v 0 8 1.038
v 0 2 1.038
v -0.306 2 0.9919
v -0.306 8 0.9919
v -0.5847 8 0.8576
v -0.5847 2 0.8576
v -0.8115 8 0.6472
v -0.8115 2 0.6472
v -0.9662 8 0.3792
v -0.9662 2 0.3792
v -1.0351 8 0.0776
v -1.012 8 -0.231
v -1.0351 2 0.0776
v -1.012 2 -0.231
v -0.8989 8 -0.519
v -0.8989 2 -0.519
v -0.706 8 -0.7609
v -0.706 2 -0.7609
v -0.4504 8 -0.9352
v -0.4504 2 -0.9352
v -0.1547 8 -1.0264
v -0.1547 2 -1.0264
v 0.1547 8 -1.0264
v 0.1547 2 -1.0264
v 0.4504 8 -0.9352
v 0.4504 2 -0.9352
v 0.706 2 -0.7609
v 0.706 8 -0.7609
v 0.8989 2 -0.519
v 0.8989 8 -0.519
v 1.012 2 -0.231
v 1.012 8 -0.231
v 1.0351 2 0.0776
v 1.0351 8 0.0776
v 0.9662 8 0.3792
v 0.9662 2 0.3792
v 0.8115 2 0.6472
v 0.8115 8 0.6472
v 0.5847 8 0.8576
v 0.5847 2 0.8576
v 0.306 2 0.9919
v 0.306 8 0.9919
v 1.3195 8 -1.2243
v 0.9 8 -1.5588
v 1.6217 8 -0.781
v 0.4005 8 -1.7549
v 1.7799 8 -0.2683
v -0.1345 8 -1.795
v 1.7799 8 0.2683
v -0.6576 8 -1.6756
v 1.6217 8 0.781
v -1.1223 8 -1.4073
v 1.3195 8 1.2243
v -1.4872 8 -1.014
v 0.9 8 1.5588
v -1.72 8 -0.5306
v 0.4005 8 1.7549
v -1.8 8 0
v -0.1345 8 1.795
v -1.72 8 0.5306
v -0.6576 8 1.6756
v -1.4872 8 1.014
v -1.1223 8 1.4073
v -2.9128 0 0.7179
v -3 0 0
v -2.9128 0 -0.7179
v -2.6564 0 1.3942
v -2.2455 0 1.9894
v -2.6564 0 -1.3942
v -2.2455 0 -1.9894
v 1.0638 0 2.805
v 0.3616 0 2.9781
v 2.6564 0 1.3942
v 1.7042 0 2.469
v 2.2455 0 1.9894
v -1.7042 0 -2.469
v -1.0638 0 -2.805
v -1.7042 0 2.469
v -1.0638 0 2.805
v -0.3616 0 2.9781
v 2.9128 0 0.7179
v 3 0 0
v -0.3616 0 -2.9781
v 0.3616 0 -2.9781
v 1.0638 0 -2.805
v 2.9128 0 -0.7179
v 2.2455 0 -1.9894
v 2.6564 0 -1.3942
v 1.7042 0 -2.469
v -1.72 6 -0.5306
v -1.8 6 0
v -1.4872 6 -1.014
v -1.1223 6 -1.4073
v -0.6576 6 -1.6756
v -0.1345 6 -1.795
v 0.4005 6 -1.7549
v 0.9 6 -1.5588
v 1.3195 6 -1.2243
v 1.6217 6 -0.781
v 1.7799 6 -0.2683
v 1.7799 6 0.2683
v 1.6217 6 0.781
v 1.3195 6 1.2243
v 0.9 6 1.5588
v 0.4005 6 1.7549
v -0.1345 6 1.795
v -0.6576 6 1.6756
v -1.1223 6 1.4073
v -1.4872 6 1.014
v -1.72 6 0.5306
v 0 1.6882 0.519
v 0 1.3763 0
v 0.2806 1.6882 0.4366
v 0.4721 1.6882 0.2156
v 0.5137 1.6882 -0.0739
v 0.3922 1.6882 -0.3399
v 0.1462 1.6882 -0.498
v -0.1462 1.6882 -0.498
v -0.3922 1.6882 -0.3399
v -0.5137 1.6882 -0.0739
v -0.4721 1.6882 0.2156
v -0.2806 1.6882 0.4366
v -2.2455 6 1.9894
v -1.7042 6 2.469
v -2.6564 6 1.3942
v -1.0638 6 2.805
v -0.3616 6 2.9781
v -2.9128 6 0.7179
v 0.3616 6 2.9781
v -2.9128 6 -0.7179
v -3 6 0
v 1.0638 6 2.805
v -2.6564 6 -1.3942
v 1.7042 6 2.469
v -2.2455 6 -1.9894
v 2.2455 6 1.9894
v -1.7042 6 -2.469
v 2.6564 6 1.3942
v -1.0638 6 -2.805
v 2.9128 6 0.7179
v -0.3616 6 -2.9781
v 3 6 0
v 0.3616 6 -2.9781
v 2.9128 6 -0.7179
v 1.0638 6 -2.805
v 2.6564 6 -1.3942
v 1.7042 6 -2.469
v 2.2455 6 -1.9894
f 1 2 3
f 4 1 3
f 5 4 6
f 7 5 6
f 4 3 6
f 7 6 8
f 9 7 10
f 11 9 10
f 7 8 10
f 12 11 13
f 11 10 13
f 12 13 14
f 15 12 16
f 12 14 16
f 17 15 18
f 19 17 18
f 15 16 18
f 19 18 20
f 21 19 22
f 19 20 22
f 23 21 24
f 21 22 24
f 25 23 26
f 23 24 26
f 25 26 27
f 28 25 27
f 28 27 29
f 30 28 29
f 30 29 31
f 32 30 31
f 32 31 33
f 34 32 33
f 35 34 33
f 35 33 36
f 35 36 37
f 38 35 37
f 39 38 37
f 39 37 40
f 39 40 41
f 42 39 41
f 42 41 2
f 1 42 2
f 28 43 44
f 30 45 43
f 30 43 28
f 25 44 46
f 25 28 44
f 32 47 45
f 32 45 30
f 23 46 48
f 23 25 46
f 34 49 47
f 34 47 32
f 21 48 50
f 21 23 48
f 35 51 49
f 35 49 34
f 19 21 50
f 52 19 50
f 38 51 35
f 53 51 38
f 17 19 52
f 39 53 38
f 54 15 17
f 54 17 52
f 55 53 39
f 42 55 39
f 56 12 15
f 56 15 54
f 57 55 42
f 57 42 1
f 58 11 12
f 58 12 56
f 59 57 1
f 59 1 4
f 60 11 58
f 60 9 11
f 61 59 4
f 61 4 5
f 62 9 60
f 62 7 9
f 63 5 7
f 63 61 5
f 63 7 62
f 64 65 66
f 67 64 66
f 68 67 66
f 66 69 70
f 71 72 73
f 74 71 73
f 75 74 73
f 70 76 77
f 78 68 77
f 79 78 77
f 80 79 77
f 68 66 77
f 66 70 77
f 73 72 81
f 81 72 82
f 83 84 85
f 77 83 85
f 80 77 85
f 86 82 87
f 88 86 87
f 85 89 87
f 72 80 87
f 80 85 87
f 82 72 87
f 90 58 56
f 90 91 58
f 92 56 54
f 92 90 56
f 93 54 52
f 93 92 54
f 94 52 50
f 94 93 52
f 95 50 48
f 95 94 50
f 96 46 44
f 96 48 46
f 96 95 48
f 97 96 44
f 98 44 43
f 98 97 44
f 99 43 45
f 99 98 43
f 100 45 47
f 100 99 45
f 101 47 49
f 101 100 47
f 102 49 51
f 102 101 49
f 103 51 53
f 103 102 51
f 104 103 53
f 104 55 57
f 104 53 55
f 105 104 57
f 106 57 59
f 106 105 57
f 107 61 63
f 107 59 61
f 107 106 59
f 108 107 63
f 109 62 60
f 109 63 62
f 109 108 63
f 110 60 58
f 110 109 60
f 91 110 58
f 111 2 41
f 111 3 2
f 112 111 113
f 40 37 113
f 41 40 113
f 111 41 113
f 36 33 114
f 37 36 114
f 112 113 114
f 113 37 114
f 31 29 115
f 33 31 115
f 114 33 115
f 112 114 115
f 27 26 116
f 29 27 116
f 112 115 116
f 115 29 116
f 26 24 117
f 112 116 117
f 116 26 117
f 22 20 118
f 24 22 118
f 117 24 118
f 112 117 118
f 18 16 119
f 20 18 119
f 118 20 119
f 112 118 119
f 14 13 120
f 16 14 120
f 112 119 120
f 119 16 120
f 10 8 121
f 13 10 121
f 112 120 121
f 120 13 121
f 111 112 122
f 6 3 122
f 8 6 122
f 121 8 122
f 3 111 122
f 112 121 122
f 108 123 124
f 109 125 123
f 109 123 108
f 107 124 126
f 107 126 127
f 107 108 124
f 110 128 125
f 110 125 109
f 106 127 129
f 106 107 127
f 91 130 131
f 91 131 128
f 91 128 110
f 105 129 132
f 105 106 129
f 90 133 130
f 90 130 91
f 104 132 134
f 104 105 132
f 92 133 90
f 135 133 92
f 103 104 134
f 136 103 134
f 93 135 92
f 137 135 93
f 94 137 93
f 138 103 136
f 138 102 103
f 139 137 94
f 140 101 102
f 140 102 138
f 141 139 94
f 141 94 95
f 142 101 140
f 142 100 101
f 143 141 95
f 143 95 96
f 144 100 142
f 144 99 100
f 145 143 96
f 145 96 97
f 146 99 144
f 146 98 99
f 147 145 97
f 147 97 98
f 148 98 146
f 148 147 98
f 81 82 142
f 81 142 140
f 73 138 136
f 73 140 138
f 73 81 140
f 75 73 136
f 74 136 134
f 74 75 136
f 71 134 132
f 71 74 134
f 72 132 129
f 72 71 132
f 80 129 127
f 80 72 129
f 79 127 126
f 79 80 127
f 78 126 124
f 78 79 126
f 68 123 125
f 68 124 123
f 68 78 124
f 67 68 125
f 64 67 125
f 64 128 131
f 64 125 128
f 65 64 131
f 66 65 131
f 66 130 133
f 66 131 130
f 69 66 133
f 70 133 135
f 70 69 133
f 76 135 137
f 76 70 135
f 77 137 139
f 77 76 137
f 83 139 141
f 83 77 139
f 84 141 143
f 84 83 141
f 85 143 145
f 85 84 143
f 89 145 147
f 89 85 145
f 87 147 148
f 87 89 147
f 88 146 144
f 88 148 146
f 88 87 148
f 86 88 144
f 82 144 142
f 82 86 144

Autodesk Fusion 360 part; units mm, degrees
sketch "Sketch1" plane through (0, 0, 0) normal (0, 1, 0) x (1, 0, 0)
  circle A0 centre (0, 0) radius 3
extrude "Extrude1" add sketch "Sketch1" along normal blind 6
sketch "Sketch2" plane through (0, 6, 0) normal (0, 1, 0) x (-1, 0, 0)
  circle A0 centre (0, 0) radius 3
  circle A1 centre (0, 0) radius 1.8
extrude "Extrude2" add sketch "Sketch2" along normal blind 2 contours A1
hole "Hole1" at (0, 8, 0) direction (0, -1, 0) diameter 2.076 depth 6 tip angle 118
